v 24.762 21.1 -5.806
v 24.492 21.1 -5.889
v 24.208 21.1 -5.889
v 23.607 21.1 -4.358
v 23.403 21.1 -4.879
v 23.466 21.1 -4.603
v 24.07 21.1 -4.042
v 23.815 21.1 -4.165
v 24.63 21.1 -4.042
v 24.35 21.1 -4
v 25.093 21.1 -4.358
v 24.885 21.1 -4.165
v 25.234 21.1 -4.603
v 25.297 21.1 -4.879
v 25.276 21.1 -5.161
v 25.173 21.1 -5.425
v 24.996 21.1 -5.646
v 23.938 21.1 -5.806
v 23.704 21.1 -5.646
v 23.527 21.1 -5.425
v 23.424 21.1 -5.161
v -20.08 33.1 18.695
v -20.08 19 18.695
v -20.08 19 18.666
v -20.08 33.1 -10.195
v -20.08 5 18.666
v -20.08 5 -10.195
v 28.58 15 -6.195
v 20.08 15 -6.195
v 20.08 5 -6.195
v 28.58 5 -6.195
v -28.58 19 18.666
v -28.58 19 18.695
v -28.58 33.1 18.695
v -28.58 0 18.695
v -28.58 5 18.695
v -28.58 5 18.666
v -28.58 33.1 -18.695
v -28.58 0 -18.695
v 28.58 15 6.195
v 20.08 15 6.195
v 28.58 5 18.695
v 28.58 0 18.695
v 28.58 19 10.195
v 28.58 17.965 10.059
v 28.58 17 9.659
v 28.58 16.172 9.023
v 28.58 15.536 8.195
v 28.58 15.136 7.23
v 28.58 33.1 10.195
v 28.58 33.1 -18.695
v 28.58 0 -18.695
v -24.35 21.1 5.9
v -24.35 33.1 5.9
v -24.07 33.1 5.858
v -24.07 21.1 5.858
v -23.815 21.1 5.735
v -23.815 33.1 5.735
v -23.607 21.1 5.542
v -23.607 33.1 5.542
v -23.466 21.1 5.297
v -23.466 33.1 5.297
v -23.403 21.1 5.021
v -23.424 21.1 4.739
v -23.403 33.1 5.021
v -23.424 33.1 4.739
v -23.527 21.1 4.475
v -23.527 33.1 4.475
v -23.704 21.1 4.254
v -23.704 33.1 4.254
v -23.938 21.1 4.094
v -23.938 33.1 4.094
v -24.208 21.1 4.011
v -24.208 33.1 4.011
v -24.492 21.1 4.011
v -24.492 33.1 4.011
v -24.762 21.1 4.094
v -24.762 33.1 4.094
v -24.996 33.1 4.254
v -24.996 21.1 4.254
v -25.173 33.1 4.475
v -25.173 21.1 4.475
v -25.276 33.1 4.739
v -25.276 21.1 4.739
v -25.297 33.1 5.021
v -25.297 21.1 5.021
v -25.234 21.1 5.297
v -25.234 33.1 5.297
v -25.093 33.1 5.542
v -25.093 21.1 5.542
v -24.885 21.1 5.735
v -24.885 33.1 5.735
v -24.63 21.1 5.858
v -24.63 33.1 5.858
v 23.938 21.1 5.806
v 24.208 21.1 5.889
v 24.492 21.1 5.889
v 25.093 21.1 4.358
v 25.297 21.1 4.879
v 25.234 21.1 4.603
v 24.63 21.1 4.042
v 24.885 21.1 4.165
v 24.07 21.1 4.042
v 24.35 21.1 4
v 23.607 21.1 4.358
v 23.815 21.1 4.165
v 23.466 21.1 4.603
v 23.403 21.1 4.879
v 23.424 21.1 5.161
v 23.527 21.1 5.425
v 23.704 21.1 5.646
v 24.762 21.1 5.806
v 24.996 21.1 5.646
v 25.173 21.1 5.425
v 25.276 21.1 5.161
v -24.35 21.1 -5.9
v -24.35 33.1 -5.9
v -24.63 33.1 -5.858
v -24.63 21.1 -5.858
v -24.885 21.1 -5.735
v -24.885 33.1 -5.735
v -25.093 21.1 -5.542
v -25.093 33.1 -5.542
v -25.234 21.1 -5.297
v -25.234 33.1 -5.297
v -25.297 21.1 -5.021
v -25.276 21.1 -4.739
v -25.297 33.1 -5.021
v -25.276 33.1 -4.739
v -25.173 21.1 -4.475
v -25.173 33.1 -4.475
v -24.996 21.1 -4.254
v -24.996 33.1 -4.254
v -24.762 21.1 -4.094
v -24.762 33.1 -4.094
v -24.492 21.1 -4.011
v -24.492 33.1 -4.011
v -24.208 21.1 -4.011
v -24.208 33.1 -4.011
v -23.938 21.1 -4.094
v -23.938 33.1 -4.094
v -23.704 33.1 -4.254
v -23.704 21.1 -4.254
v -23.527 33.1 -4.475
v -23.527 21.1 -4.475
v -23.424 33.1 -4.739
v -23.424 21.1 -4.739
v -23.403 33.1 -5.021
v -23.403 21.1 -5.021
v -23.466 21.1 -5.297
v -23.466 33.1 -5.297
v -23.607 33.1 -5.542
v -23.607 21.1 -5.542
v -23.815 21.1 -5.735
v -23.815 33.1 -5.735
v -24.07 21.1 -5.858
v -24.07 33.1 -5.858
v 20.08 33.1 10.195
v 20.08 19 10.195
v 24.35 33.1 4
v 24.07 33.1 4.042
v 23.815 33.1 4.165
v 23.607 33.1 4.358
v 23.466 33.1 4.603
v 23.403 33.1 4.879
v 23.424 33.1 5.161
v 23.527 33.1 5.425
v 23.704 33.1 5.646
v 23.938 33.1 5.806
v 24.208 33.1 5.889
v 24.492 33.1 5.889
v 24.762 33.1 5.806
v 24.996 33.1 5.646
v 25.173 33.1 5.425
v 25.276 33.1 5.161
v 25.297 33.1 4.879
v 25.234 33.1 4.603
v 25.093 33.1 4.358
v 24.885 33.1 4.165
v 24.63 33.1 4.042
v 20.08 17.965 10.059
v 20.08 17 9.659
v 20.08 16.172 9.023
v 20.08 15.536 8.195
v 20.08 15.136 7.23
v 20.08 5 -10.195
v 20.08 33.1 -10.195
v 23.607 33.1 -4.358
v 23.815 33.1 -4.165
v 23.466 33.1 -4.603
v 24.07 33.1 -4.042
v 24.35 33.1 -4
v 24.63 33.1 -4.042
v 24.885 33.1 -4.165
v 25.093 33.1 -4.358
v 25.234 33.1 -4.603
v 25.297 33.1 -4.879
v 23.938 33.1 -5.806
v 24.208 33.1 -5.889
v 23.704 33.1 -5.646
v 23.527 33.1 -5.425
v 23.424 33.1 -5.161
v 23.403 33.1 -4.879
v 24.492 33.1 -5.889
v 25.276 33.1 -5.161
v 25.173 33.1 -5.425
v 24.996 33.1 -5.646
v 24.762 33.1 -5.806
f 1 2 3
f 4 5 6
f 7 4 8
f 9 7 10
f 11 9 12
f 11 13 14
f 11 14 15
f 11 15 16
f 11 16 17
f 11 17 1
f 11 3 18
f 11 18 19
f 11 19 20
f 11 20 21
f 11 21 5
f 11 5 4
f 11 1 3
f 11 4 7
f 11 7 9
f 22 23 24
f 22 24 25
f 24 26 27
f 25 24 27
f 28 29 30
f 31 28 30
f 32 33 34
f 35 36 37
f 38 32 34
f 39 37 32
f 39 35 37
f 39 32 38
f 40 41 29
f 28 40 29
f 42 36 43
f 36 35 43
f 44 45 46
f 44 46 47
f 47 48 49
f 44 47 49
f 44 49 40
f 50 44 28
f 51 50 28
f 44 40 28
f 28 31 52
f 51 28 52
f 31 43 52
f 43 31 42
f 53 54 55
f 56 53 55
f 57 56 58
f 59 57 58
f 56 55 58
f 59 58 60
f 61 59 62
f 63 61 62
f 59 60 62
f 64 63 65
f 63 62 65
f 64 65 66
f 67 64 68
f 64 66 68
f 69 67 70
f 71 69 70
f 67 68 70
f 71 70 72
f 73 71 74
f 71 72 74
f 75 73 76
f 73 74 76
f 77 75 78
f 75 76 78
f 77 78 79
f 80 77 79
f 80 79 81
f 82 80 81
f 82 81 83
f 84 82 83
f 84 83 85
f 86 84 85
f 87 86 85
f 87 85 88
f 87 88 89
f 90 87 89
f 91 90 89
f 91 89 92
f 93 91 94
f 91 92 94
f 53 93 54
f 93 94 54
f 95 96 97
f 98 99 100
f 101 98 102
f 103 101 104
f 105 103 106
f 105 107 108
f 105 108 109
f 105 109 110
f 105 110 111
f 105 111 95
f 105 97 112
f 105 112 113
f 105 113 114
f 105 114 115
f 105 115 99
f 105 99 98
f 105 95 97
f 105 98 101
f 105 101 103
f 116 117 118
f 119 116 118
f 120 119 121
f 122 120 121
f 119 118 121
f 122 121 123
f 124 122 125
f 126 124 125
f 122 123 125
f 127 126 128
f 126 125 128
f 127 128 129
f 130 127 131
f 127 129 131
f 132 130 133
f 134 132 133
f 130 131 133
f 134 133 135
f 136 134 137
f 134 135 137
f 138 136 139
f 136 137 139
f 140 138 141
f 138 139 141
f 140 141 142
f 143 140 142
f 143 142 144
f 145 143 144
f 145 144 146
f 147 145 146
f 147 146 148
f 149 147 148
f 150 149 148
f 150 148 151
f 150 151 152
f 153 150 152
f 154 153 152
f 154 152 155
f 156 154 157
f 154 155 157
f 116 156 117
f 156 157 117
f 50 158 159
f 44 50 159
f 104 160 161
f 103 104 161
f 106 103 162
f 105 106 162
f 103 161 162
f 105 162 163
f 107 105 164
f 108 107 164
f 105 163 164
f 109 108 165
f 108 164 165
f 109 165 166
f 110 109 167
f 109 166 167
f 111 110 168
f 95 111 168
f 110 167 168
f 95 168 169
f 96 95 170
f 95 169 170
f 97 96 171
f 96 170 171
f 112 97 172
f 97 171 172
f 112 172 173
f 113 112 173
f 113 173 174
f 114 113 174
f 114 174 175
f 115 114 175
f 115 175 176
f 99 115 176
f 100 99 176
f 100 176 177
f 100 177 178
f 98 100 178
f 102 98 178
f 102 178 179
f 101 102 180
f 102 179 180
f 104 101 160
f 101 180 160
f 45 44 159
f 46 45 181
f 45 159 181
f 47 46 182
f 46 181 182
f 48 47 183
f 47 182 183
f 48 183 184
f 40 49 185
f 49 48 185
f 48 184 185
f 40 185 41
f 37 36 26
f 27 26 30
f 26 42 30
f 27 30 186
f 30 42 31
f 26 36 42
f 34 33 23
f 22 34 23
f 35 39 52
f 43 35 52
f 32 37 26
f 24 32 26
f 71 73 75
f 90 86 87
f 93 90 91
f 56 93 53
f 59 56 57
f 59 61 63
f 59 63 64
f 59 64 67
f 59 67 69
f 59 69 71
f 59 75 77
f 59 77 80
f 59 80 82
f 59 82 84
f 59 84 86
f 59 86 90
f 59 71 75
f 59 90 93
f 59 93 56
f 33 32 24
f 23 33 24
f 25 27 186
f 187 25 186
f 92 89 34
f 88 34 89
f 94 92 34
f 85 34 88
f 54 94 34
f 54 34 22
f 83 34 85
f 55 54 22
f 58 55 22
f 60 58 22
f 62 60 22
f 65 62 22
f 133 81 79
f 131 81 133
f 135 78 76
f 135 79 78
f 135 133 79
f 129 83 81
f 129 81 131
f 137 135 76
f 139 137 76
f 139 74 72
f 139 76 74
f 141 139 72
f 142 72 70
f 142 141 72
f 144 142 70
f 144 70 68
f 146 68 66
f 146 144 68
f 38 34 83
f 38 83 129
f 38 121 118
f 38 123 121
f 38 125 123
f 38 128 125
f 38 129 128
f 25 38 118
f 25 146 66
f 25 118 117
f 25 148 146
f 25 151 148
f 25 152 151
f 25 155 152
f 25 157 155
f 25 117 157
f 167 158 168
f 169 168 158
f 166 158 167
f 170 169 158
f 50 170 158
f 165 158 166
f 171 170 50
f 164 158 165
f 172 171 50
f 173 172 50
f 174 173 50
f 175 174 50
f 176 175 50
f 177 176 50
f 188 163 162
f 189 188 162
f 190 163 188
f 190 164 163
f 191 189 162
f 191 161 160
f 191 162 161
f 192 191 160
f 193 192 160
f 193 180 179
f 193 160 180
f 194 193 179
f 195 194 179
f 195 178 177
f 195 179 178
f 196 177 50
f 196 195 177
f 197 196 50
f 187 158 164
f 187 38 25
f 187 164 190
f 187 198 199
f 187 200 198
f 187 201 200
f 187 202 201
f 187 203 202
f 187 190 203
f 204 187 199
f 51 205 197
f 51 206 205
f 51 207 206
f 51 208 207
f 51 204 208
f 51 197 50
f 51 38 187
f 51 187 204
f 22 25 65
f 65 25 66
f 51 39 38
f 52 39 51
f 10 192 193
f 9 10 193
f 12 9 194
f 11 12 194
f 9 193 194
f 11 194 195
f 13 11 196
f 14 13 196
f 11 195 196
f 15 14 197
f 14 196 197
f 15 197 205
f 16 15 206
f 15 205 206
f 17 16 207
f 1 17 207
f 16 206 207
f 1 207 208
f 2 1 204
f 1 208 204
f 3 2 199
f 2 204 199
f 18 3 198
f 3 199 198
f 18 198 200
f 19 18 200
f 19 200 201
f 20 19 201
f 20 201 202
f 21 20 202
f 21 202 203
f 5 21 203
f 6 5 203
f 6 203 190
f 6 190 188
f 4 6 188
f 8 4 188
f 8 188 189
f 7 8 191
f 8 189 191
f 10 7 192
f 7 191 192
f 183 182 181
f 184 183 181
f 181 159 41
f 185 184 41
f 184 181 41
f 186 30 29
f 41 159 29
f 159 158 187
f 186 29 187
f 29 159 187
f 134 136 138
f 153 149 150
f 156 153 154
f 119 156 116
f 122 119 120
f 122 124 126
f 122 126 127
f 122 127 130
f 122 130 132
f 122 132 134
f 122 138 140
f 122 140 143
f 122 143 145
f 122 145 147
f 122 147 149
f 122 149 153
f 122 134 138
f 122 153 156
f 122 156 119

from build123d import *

# Parameters (mm, degrees)
SKETCH1_W           = 57.16
SKETCH1_H           = 37.39
SKETCH1_W_2         = 40.16
SKETCH1_H_2         = 20.39
BOSS_EXTRUDE1_DEPTH = 5
SKETCH2_W           = 57.16
SKETCH2_H           = 37.39
SKETCH2_W_2         = 40.16
SKETCH2_H_2         = 20.39
BOSS_EXTRUDE2_DEPTH = 28.1
SKETCH3_W           = 48.66
SKETCH3_H           = 8.5
CUT_EXTRUDE1_DEPTH  = 28.1
CUT_EXTRUDE2_REACH  = 63.749
SKETCH5_W           = 16.39
SKETCH5_H           = 10
FILLET1_R           = 4
SKETCH6_R           = 0.95
CUT_EXTRUDE3_DEPTH  = 12
CUT_EXTRUDE4_REACH  = 63.749
SKETCH8_W           = 8.5
SKETCH8_H           = 8.5
BOSS_EXTRUDE3_DEPTH = 14.1
BOSS_EXTRUDE4_REACH = 46.226
SKETCH9_W           = 8.5
SKETCH9_H           = 24.86117923


with BuildPart() as part:
    # Sketch1 → Boss-Extrude1 (new body)
    # profile 1 of 2: a face of its own
    with BuildSketch(Plane(origin=(0, 0, 0), x_dir=(1, 0, 0), z_dir=(0, 1, 0))):
        Rectangle(SKETCH1_W, SKETCH1_H)
        Rectangle(SKETCH1_W_2, SKETCH1_H_2, mode=Mode.SUBTRACT)
    # profile 2 of 2: a face of its own
    with BuildSketch(Plane(origin=(0, 0, 0), x_dir=(1, 0, 0), z_dir=(0, 1, 0))):
        Rectangle(SKETCH1_W_2, SKETCH1_H_2)
    extrude(amount=BOSS_EXTRUDE1_DEPTH)

    # Sketch2 → Boss-Extrude2 (add)
    with BuildSketch(Plane(origin=(0, 5, 0), x_dir=(1, 0, 0), z_dir=(0, 1, 0))):
        Rectangle(SKETCH2_W, SKETCH2_H)
        Rectangle(SKETCH2_W_2, SKETCH2_H_2, mode=Mode.SUBTRACT)
    extrude(amount=BOSS_EXTRUDE2_DEPTH)

    # Sketch3 → Cut-Extrude1 (cut)
    with BuildSketch(Plane(origin=(0, 33.1, 0), x_dir=(1, 0, 0), z_dir=(0, 1, 0))):
        with Locations((-4.25, -14.445)):
            Rectangle(SKETCH3_W, SKETCH3_H)
    extrude(amount=-CUT_EXTRUDE1_DEPTH, mode=Mode.SUBTRACT)

    # Sketch5 → Cut-Extrude2 (cut, up to next)
    with BuildSketch(Plane(origin=(-20.08, 0, 0), x_dir=(0, 0, -1), z_dir=(1, 0, 0)), mode=Mode.PRIVATE) as cut_extrude2_sk1:
        with Locations((-2, 10)):
            Rectangle(SKETCH5_W, SKETCH5_H)
    cut_extrude2_tool1 = extrude(cut_extrude2_sk1.sketch, amount=-CUT_EXTRUDE2_REACH, mode=Mode.PRIVATE) & part.part
    add(cut_extrude2_tool1.solids().sort_by_distance((-20.08, 10, 2))[0], mode=Mode.SUBTRACT)

    # Fillet1
    fillet1_edges = [part.edges().sort_by_distance(p)[0] for p in [
        (-24.33, 15, 10.195),
    ]]
    fillet(fillet1_edges, radius=FILLET1_R)

    # Sketch6 → Cut-Extrude3 (cut)
    with BuildSketch(Plane(origin=(0, 33.1, 0), x_dir=(1, 0, 0), z_dir=(0, 1, 0))):
        with Locations(Location((-24.35, -4.95, 0), (0, 0, 270))):
            Circle(SKETCH6_R)
        with Locations(Location((-24.35, 4.95, 0), (0, 0, 90))):
            Circle(SKETCH6_R)
        with Locations(Location((24.35, 4.95, 0), (0, 0, 270))):
            Circle(SKETCH6_R)
        with Locations(Location((24.35, -4.95, 0), (0, 0, 90))):
            Circle(SKETCH6_R)
    extrude(amount=-CUT_EXTRUDE3_DEPTH, mode=Mode.SUBTRACT)

    # Sketch7 → Cut-Extrude4 (cut, up to next)
    with BuildSketch(Plane.ZY.offset(-20.08), mode=Mode.PRIVATE) as cut_extrude4_sk1:
        with BuildLine():
            Line((10.195, 33.1), (10.195, 19))
            ThreePointArc((10.195, 19), (9.023427125, 16.171572875), (6.195, 15))
            Line((6.195, 15), (-6.195, 15))
            Line((-6.195, 15), (-6.195, 5))
            Line((-6.195, 5), (18.695, 5))
            Line((18.695, 5), (18.695, 33.1))
            Line((18.695, 33.1), (10.195, 33.1))
        make_face()
    cut_extrude4_tool1 = extrude(cut_extrude4_sk1.sketch, amount=-CUT_EXTRUDE4_REACH, mode=Mode.PRIVATE) & part.part
    add(cut_extrude4_tool1.solids().sort_by_distance((20.08, 15.371532, 9.379812))[0], mode=Mode.SUBTRACT)

    # Sketch8 → Boss-Extrude3 (add)
    with BuildSketch(Plane(origin=(0, 33.1, 0), x_dir=(1, 0, 0), z_dir=(0, 1, 0))):
        with Locations((-24.33, -14.445)):
            Rectangle(SKETCH8_W, SKETCH8_H)
    extrude(amount=-BOSS_EXTRUDE3_DEPTH)

    # Sketch9 → Boss-Extrude4 (add, up to next)
    with BuildSketch(Plane(origin=(0, 5, 0), x_dir=(1, 0, 0), z_dir=(0, 1, 0)), mode=Mode.PRIVATE) as boss_extrude4_sk1:
        with Locations((-24.33, -6.235589615)):
            Rectangle(SKETCH9_W, SKETCH9_H)
    boss_extrude4_tool1 = extrude(boss_extrude4_sk1.sketch, amount=BOSS_EXTRUDE4_REACH, mode=Mode.PRIVATE) - part.part
    add(boss_extrude4_tool1.solids().sort_by_distance((-24.33, 5, 6.23559))[0])


solid = part.part
